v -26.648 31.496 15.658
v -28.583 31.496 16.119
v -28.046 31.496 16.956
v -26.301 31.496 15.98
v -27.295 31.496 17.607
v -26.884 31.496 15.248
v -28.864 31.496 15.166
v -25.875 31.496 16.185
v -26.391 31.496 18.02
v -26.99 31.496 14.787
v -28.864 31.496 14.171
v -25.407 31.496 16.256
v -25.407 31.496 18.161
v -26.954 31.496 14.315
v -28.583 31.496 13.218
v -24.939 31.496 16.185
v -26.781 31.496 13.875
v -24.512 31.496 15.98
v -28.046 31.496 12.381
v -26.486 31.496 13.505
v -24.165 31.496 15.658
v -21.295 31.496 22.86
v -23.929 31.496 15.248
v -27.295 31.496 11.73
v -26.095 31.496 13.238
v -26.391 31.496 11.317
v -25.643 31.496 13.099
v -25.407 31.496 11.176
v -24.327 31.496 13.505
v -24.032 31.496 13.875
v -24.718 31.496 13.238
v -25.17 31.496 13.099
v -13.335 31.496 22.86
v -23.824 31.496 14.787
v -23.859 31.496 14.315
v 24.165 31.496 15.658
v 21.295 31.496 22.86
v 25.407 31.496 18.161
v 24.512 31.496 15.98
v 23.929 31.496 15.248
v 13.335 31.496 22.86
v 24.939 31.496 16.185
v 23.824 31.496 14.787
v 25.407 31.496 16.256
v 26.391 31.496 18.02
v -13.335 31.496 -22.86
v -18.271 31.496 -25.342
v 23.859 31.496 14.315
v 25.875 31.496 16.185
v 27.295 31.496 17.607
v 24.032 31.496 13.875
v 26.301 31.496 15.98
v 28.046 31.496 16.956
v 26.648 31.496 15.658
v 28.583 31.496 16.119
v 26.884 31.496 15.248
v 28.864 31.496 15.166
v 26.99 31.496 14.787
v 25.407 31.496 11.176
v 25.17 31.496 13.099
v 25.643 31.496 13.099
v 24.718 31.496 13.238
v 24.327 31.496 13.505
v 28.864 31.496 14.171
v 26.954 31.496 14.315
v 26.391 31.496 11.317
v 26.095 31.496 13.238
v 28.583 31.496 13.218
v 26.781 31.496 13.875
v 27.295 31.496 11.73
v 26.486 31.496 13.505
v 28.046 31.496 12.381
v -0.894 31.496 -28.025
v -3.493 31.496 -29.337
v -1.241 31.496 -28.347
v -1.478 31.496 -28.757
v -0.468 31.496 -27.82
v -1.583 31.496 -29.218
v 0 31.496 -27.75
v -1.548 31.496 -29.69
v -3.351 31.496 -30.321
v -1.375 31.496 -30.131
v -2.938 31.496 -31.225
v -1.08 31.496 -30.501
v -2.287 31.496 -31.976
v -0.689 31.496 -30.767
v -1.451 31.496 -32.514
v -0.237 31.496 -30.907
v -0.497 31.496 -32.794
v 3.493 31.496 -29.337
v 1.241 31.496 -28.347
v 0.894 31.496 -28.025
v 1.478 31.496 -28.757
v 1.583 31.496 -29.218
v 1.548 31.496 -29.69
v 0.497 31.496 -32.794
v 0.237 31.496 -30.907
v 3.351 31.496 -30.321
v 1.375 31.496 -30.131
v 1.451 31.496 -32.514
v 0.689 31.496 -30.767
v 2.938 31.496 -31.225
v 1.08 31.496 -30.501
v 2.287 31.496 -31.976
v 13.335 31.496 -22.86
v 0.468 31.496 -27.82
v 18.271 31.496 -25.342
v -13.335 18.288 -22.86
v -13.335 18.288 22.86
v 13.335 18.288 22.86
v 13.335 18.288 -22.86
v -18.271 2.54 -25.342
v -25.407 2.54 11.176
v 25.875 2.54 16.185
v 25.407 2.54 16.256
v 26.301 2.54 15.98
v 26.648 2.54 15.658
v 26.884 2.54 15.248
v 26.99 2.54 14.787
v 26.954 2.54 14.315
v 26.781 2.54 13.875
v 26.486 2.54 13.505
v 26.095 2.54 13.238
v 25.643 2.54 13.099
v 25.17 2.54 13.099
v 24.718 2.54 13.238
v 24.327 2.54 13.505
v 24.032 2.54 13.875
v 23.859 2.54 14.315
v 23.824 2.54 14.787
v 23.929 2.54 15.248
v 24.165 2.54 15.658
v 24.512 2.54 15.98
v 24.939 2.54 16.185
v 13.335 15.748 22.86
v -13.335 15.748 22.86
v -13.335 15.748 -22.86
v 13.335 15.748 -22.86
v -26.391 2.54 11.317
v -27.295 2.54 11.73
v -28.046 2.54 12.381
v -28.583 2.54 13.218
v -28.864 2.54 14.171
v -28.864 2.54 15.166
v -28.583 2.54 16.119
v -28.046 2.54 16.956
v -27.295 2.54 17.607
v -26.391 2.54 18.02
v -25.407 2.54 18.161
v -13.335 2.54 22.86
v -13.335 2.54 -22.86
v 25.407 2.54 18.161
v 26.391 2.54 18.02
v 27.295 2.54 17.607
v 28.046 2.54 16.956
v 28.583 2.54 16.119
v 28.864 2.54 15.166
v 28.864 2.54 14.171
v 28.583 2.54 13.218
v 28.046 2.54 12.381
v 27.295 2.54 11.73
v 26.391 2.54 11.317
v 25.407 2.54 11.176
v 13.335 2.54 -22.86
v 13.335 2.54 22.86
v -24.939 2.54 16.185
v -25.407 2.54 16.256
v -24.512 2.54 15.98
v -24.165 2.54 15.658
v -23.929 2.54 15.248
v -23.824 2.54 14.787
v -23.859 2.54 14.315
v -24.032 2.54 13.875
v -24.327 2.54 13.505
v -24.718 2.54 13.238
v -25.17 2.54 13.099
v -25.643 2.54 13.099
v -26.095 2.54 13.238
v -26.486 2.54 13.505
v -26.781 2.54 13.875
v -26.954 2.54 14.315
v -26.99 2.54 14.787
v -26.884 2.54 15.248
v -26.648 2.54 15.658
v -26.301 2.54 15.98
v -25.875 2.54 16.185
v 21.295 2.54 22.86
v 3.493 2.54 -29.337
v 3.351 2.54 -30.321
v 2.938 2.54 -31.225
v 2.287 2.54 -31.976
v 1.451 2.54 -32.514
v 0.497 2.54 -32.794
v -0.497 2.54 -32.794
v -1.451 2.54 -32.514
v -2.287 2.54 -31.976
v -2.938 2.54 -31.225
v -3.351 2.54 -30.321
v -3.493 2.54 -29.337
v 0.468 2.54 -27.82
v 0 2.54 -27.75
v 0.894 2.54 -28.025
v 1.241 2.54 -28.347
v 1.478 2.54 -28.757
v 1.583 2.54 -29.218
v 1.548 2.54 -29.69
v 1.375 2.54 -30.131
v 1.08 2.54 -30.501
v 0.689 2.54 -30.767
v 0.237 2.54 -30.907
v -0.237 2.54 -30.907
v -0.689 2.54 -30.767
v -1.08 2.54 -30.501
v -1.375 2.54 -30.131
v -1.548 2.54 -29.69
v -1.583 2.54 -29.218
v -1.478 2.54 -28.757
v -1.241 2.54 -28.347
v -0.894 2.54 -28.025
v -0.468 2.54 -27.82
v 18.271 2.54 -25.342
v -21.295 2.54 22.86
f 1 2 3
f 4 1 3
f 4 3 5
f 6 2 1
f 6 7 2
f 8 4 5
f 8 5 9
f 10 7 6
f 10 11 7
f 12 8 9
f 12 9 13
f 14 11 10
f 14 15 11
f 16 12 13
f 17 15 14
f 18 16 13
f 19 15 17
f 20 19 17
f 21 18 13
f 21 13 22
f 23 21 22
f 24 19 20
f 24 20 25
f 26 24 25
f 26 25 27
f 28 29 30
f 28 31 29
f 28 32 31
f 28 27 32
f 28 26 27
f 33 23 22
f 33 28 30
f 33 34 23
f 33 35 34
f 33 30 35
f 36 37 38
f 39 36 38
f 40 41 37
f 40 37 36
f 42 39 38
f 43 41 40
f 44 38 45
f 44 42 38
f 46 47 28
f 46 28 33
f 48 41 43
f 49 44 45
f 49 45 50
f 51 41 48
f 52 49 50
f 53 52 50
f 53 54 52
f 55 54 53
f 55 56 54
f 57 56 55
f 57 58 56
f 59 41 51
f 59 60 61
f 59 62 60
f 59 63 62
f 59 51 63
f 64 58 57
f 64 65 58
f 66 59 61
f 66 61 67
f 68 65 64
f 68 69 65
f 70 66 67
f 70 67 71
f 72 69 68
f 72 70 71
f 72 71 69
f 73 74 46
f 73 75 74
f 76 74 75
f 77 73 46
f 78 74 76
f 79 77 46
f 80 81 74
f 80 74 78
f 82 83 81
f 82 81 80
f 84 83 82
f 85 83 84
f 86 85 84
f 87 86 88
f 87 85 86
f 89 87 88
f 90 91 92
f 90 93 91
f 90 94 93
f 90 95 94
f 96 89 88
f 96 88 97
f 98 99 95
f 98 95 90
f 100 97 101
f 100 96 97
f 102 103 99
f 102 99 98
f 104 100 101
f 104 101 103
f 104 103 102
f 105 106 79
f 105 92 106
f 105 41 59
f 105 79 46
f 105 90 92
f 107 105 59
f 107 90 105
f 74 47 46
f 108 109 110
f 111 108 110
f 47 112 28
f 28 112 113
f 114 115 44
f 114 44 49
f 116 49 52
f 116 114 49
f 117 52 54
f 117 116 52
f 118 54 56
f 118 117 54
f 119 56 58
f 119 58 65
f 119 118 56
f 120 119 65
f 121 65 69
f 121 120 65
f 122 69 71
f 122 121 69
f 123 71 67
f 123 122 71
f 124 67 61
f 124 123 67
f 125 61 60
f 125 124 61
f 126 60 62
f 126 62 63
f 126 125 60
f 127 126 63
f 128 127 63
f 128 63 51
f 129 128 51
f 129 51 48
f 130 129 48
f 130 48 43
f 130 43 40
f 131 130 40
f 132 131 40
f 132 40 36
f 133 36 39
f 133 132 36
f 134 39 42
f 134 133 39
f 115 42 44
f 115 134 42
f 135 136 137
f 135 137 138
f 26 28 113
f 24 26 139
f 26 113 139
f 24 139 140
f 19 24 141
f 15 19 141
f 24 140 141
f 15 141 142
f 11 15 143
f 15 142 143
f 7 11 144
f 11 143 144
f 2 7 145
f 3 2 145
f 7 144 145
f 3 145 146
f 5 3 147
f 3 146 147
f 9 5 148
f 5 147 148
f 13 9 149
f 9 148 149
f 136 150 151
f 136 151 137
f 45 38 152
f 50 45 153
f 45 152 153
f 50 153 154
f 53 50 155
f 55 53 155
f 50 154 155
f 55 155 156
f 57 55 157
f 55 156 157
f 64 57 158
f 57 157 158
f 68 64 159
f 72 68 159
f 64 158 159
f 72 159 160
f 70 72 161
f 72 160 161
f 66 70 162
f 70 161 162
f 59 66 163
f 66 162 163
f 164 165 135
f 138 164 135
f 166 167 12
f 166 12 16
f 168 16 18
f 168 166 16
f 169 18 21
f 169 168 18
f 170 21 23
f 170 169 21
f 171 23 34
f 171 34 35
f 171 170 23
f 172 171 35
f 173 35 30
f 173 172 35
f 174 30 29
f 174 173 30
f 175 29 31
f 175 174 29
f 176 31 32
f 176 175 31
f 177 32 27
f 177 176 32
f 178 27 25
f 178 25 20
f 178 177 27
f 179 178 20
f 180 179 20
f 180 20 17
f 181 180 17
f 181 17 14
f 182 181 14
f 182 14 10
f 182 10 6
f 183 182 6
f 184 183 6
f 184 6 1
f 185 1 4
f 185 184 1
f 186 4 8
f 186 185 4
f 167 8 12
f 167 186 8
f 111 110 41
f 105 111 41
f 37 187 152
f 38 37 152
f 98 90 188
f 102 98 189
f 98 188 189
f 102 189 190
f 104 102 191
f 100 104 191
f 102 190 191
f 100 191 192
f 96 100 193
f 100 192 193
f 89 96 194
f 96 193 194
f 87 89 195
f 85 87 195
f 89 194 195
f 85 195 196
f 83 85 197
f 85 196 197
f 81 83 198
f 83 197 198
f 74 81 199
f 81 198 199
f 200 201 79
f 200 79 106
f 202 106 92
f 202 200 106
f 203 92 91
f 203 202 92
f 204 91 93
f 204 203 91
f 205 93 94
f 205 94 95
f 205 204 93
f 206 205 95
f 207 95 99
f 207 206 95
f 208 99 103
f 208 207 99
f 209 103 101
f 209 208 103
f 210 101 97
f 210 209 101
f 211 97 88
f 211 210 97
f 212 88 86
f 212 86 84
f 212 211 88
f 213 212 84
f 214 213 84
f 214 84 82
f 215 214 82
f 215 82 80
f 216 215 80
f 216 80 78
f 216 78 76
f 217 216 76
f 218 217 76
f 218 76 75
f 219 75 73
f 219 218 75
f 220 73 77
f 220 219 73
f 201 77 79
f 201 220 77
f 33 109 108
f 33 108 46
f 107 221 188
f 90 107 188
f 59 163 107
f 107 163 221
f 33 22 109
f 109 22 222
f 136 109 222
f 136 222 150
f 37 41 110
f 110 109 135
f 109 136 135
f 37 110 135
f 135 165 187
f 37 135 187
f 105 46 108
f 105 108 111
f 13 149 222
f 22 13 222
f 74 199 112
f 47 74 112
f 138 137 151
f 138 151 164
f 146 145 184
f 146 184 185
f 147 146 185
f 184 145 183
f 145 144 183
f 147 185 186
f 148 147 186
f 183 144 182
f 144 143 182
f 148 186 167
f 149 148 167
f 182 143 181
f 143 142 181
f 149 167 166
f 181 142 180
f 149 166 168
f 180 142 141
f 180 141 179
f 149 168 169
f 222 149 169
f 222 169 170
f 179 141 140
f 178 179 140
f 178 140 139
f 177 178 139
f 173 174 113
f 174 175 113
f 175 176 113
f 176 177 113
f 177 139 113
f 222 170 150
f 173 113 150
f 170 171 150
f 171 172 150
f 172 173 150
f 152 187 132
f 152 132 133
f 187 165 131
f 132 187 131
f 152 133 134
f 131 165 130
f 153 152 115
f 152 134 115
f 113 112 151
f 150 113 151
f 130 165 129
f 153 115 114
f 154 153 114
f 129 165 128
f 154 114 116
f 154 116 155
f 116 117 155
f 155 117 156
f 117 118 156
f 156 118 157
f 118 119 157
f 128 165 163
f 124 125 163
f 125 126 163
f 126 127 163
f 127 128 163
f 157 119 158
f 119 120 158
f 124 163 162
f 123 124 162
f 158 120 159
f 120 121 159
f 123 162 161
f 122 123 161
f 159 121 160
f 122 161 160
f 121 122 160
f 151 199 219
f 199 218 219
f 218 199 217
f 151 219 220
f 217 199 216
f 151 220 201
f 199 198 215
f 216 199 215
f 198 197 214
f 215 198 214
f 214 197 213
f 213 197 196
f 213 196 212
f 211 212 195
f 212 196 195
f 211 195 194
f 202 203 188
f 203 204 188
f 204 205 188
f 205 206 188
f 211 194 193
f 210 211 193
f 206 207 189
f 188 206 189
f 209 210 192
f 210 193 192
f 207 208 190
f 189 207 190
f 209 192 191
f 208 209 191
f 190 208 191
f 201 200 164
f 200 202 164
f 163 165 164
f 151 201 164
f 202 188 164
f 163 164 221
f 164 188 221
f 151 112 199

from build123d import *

# Parameters (mm, degrees)
SKETCH1_R           = 38.1
SKETCH1_R_2         = 1.5875
BOSS_EXTRUDE1_DEPTH = 2.54
SKETCH2_R           = 1.5875
BOSS_EXTRUDE2_DEPTH = 28.956
SKETCH3_W           = 26.67
SKETCH3_H           = 17.78
CUT_EXTRUDE1_DEPTH  = 45.72


with BuildPart() as part:
    # Sketch1 → Boss-Extrude1 (new body)
    with BuildSketch(Plane(origin=(0, 0, 0), x_dir=(1, 0, 0), z_dir=(0, 1, 0))):
        with Locations(Location((0, 0, 0), (0, 0, 270))):
            Circle(SKETCH1_R)
        with Locations(Location((0, 29.337, 0), (0, 0, 270))):
            Circle(SKETCH1_R_2, mode=Mode.SUBTRACT)
        with Locations(Location((25.406587271, -14.6685, 0), (0, 0, 270))):
            Circle(SKETCH1_R_2, mode=Mode.SUBTRACT)
        with Locations(Location((-25.406587271, -14.6685, 0), (0, 0, 270))):
            Circle(SKETCH1_R_2, mode=Mode.SUBTRACT)
    extrude(amount=BOSS_EXTRUDE1_DEPTH)


with BuildPart() as body_2:
    # Sketch2 → Boss-Extrude2 (new body)
    with BuildSketch(Plane(origin=(0, 2.54, 0), x_dir=(1, 0, 0), z_dir=(0, 1, 0))):
        with BuildLine():
            Line((25.406587271, -11.176), (18.270749664, 25.342499299))
            Line((18.270749664, 25.342499299), (3.4925, 29.337))
            ThreePointArc((3.4925, 29.337), (0, 32.8295), (-3.4925, 29.337))
            Line((-3.4925, 29.337), (-18.270749664, 25.342499299))
            Line((-18.270749664, 25.342499299), (-25.406587271, -11.176))
            ThreePointArc((-25.406587271, -11.176), (-28.899087271, -14.6685), (-25.406587271, -18.161))
            Line((-25.406587271, -18.161), (-21.295139445, -22.86))
            Line((-21.295139445, -22.86), (21.295139445, -22.86))
            Line((21.295139445, -22.86), (25.406587271, -18.161))
            ThreePointArc((25.406587271, -18.161), (28.899087271, -14.6685), (25.406587271, -11.176))
        make_face()
        with Locations(Location((25.406587271, -14.6685, 0), (0, 0, 270))):
            Circle(SKETCH2_R, mode=Mode.SUBTRACT)
        with Locations(Location((0, 29.337, 0), (0, 0, 270))):
            Circle(SKETCH2_R, mode=Mode.SUBTRACT)
        with Locations(Location((-25.406587271, -14.6685, 0), (0, 0, 270))):
            Circle(SKETCH2_R, mode=Mode.SUBTRACT)
    extrude(amount=BOSS_EXTRUDE2_DEPTH)

    # Sketch3 → Cut-Extrude1 (cut)
    with BuildSketch(Plane.XY.offset(22.86)):
        with Locations((0, 27.178)):
            Rectangle(SKETCH3_W, SKETCH3_H)
        with Locations((0, 6.858)):
            Rectangle(SKETCH3_W, SKETCH3_H)
    extrude(amount=-CUT_EXTRUDE1_DEPTH, mode=Mode.SUBTRACT)


solid = body_2.part
